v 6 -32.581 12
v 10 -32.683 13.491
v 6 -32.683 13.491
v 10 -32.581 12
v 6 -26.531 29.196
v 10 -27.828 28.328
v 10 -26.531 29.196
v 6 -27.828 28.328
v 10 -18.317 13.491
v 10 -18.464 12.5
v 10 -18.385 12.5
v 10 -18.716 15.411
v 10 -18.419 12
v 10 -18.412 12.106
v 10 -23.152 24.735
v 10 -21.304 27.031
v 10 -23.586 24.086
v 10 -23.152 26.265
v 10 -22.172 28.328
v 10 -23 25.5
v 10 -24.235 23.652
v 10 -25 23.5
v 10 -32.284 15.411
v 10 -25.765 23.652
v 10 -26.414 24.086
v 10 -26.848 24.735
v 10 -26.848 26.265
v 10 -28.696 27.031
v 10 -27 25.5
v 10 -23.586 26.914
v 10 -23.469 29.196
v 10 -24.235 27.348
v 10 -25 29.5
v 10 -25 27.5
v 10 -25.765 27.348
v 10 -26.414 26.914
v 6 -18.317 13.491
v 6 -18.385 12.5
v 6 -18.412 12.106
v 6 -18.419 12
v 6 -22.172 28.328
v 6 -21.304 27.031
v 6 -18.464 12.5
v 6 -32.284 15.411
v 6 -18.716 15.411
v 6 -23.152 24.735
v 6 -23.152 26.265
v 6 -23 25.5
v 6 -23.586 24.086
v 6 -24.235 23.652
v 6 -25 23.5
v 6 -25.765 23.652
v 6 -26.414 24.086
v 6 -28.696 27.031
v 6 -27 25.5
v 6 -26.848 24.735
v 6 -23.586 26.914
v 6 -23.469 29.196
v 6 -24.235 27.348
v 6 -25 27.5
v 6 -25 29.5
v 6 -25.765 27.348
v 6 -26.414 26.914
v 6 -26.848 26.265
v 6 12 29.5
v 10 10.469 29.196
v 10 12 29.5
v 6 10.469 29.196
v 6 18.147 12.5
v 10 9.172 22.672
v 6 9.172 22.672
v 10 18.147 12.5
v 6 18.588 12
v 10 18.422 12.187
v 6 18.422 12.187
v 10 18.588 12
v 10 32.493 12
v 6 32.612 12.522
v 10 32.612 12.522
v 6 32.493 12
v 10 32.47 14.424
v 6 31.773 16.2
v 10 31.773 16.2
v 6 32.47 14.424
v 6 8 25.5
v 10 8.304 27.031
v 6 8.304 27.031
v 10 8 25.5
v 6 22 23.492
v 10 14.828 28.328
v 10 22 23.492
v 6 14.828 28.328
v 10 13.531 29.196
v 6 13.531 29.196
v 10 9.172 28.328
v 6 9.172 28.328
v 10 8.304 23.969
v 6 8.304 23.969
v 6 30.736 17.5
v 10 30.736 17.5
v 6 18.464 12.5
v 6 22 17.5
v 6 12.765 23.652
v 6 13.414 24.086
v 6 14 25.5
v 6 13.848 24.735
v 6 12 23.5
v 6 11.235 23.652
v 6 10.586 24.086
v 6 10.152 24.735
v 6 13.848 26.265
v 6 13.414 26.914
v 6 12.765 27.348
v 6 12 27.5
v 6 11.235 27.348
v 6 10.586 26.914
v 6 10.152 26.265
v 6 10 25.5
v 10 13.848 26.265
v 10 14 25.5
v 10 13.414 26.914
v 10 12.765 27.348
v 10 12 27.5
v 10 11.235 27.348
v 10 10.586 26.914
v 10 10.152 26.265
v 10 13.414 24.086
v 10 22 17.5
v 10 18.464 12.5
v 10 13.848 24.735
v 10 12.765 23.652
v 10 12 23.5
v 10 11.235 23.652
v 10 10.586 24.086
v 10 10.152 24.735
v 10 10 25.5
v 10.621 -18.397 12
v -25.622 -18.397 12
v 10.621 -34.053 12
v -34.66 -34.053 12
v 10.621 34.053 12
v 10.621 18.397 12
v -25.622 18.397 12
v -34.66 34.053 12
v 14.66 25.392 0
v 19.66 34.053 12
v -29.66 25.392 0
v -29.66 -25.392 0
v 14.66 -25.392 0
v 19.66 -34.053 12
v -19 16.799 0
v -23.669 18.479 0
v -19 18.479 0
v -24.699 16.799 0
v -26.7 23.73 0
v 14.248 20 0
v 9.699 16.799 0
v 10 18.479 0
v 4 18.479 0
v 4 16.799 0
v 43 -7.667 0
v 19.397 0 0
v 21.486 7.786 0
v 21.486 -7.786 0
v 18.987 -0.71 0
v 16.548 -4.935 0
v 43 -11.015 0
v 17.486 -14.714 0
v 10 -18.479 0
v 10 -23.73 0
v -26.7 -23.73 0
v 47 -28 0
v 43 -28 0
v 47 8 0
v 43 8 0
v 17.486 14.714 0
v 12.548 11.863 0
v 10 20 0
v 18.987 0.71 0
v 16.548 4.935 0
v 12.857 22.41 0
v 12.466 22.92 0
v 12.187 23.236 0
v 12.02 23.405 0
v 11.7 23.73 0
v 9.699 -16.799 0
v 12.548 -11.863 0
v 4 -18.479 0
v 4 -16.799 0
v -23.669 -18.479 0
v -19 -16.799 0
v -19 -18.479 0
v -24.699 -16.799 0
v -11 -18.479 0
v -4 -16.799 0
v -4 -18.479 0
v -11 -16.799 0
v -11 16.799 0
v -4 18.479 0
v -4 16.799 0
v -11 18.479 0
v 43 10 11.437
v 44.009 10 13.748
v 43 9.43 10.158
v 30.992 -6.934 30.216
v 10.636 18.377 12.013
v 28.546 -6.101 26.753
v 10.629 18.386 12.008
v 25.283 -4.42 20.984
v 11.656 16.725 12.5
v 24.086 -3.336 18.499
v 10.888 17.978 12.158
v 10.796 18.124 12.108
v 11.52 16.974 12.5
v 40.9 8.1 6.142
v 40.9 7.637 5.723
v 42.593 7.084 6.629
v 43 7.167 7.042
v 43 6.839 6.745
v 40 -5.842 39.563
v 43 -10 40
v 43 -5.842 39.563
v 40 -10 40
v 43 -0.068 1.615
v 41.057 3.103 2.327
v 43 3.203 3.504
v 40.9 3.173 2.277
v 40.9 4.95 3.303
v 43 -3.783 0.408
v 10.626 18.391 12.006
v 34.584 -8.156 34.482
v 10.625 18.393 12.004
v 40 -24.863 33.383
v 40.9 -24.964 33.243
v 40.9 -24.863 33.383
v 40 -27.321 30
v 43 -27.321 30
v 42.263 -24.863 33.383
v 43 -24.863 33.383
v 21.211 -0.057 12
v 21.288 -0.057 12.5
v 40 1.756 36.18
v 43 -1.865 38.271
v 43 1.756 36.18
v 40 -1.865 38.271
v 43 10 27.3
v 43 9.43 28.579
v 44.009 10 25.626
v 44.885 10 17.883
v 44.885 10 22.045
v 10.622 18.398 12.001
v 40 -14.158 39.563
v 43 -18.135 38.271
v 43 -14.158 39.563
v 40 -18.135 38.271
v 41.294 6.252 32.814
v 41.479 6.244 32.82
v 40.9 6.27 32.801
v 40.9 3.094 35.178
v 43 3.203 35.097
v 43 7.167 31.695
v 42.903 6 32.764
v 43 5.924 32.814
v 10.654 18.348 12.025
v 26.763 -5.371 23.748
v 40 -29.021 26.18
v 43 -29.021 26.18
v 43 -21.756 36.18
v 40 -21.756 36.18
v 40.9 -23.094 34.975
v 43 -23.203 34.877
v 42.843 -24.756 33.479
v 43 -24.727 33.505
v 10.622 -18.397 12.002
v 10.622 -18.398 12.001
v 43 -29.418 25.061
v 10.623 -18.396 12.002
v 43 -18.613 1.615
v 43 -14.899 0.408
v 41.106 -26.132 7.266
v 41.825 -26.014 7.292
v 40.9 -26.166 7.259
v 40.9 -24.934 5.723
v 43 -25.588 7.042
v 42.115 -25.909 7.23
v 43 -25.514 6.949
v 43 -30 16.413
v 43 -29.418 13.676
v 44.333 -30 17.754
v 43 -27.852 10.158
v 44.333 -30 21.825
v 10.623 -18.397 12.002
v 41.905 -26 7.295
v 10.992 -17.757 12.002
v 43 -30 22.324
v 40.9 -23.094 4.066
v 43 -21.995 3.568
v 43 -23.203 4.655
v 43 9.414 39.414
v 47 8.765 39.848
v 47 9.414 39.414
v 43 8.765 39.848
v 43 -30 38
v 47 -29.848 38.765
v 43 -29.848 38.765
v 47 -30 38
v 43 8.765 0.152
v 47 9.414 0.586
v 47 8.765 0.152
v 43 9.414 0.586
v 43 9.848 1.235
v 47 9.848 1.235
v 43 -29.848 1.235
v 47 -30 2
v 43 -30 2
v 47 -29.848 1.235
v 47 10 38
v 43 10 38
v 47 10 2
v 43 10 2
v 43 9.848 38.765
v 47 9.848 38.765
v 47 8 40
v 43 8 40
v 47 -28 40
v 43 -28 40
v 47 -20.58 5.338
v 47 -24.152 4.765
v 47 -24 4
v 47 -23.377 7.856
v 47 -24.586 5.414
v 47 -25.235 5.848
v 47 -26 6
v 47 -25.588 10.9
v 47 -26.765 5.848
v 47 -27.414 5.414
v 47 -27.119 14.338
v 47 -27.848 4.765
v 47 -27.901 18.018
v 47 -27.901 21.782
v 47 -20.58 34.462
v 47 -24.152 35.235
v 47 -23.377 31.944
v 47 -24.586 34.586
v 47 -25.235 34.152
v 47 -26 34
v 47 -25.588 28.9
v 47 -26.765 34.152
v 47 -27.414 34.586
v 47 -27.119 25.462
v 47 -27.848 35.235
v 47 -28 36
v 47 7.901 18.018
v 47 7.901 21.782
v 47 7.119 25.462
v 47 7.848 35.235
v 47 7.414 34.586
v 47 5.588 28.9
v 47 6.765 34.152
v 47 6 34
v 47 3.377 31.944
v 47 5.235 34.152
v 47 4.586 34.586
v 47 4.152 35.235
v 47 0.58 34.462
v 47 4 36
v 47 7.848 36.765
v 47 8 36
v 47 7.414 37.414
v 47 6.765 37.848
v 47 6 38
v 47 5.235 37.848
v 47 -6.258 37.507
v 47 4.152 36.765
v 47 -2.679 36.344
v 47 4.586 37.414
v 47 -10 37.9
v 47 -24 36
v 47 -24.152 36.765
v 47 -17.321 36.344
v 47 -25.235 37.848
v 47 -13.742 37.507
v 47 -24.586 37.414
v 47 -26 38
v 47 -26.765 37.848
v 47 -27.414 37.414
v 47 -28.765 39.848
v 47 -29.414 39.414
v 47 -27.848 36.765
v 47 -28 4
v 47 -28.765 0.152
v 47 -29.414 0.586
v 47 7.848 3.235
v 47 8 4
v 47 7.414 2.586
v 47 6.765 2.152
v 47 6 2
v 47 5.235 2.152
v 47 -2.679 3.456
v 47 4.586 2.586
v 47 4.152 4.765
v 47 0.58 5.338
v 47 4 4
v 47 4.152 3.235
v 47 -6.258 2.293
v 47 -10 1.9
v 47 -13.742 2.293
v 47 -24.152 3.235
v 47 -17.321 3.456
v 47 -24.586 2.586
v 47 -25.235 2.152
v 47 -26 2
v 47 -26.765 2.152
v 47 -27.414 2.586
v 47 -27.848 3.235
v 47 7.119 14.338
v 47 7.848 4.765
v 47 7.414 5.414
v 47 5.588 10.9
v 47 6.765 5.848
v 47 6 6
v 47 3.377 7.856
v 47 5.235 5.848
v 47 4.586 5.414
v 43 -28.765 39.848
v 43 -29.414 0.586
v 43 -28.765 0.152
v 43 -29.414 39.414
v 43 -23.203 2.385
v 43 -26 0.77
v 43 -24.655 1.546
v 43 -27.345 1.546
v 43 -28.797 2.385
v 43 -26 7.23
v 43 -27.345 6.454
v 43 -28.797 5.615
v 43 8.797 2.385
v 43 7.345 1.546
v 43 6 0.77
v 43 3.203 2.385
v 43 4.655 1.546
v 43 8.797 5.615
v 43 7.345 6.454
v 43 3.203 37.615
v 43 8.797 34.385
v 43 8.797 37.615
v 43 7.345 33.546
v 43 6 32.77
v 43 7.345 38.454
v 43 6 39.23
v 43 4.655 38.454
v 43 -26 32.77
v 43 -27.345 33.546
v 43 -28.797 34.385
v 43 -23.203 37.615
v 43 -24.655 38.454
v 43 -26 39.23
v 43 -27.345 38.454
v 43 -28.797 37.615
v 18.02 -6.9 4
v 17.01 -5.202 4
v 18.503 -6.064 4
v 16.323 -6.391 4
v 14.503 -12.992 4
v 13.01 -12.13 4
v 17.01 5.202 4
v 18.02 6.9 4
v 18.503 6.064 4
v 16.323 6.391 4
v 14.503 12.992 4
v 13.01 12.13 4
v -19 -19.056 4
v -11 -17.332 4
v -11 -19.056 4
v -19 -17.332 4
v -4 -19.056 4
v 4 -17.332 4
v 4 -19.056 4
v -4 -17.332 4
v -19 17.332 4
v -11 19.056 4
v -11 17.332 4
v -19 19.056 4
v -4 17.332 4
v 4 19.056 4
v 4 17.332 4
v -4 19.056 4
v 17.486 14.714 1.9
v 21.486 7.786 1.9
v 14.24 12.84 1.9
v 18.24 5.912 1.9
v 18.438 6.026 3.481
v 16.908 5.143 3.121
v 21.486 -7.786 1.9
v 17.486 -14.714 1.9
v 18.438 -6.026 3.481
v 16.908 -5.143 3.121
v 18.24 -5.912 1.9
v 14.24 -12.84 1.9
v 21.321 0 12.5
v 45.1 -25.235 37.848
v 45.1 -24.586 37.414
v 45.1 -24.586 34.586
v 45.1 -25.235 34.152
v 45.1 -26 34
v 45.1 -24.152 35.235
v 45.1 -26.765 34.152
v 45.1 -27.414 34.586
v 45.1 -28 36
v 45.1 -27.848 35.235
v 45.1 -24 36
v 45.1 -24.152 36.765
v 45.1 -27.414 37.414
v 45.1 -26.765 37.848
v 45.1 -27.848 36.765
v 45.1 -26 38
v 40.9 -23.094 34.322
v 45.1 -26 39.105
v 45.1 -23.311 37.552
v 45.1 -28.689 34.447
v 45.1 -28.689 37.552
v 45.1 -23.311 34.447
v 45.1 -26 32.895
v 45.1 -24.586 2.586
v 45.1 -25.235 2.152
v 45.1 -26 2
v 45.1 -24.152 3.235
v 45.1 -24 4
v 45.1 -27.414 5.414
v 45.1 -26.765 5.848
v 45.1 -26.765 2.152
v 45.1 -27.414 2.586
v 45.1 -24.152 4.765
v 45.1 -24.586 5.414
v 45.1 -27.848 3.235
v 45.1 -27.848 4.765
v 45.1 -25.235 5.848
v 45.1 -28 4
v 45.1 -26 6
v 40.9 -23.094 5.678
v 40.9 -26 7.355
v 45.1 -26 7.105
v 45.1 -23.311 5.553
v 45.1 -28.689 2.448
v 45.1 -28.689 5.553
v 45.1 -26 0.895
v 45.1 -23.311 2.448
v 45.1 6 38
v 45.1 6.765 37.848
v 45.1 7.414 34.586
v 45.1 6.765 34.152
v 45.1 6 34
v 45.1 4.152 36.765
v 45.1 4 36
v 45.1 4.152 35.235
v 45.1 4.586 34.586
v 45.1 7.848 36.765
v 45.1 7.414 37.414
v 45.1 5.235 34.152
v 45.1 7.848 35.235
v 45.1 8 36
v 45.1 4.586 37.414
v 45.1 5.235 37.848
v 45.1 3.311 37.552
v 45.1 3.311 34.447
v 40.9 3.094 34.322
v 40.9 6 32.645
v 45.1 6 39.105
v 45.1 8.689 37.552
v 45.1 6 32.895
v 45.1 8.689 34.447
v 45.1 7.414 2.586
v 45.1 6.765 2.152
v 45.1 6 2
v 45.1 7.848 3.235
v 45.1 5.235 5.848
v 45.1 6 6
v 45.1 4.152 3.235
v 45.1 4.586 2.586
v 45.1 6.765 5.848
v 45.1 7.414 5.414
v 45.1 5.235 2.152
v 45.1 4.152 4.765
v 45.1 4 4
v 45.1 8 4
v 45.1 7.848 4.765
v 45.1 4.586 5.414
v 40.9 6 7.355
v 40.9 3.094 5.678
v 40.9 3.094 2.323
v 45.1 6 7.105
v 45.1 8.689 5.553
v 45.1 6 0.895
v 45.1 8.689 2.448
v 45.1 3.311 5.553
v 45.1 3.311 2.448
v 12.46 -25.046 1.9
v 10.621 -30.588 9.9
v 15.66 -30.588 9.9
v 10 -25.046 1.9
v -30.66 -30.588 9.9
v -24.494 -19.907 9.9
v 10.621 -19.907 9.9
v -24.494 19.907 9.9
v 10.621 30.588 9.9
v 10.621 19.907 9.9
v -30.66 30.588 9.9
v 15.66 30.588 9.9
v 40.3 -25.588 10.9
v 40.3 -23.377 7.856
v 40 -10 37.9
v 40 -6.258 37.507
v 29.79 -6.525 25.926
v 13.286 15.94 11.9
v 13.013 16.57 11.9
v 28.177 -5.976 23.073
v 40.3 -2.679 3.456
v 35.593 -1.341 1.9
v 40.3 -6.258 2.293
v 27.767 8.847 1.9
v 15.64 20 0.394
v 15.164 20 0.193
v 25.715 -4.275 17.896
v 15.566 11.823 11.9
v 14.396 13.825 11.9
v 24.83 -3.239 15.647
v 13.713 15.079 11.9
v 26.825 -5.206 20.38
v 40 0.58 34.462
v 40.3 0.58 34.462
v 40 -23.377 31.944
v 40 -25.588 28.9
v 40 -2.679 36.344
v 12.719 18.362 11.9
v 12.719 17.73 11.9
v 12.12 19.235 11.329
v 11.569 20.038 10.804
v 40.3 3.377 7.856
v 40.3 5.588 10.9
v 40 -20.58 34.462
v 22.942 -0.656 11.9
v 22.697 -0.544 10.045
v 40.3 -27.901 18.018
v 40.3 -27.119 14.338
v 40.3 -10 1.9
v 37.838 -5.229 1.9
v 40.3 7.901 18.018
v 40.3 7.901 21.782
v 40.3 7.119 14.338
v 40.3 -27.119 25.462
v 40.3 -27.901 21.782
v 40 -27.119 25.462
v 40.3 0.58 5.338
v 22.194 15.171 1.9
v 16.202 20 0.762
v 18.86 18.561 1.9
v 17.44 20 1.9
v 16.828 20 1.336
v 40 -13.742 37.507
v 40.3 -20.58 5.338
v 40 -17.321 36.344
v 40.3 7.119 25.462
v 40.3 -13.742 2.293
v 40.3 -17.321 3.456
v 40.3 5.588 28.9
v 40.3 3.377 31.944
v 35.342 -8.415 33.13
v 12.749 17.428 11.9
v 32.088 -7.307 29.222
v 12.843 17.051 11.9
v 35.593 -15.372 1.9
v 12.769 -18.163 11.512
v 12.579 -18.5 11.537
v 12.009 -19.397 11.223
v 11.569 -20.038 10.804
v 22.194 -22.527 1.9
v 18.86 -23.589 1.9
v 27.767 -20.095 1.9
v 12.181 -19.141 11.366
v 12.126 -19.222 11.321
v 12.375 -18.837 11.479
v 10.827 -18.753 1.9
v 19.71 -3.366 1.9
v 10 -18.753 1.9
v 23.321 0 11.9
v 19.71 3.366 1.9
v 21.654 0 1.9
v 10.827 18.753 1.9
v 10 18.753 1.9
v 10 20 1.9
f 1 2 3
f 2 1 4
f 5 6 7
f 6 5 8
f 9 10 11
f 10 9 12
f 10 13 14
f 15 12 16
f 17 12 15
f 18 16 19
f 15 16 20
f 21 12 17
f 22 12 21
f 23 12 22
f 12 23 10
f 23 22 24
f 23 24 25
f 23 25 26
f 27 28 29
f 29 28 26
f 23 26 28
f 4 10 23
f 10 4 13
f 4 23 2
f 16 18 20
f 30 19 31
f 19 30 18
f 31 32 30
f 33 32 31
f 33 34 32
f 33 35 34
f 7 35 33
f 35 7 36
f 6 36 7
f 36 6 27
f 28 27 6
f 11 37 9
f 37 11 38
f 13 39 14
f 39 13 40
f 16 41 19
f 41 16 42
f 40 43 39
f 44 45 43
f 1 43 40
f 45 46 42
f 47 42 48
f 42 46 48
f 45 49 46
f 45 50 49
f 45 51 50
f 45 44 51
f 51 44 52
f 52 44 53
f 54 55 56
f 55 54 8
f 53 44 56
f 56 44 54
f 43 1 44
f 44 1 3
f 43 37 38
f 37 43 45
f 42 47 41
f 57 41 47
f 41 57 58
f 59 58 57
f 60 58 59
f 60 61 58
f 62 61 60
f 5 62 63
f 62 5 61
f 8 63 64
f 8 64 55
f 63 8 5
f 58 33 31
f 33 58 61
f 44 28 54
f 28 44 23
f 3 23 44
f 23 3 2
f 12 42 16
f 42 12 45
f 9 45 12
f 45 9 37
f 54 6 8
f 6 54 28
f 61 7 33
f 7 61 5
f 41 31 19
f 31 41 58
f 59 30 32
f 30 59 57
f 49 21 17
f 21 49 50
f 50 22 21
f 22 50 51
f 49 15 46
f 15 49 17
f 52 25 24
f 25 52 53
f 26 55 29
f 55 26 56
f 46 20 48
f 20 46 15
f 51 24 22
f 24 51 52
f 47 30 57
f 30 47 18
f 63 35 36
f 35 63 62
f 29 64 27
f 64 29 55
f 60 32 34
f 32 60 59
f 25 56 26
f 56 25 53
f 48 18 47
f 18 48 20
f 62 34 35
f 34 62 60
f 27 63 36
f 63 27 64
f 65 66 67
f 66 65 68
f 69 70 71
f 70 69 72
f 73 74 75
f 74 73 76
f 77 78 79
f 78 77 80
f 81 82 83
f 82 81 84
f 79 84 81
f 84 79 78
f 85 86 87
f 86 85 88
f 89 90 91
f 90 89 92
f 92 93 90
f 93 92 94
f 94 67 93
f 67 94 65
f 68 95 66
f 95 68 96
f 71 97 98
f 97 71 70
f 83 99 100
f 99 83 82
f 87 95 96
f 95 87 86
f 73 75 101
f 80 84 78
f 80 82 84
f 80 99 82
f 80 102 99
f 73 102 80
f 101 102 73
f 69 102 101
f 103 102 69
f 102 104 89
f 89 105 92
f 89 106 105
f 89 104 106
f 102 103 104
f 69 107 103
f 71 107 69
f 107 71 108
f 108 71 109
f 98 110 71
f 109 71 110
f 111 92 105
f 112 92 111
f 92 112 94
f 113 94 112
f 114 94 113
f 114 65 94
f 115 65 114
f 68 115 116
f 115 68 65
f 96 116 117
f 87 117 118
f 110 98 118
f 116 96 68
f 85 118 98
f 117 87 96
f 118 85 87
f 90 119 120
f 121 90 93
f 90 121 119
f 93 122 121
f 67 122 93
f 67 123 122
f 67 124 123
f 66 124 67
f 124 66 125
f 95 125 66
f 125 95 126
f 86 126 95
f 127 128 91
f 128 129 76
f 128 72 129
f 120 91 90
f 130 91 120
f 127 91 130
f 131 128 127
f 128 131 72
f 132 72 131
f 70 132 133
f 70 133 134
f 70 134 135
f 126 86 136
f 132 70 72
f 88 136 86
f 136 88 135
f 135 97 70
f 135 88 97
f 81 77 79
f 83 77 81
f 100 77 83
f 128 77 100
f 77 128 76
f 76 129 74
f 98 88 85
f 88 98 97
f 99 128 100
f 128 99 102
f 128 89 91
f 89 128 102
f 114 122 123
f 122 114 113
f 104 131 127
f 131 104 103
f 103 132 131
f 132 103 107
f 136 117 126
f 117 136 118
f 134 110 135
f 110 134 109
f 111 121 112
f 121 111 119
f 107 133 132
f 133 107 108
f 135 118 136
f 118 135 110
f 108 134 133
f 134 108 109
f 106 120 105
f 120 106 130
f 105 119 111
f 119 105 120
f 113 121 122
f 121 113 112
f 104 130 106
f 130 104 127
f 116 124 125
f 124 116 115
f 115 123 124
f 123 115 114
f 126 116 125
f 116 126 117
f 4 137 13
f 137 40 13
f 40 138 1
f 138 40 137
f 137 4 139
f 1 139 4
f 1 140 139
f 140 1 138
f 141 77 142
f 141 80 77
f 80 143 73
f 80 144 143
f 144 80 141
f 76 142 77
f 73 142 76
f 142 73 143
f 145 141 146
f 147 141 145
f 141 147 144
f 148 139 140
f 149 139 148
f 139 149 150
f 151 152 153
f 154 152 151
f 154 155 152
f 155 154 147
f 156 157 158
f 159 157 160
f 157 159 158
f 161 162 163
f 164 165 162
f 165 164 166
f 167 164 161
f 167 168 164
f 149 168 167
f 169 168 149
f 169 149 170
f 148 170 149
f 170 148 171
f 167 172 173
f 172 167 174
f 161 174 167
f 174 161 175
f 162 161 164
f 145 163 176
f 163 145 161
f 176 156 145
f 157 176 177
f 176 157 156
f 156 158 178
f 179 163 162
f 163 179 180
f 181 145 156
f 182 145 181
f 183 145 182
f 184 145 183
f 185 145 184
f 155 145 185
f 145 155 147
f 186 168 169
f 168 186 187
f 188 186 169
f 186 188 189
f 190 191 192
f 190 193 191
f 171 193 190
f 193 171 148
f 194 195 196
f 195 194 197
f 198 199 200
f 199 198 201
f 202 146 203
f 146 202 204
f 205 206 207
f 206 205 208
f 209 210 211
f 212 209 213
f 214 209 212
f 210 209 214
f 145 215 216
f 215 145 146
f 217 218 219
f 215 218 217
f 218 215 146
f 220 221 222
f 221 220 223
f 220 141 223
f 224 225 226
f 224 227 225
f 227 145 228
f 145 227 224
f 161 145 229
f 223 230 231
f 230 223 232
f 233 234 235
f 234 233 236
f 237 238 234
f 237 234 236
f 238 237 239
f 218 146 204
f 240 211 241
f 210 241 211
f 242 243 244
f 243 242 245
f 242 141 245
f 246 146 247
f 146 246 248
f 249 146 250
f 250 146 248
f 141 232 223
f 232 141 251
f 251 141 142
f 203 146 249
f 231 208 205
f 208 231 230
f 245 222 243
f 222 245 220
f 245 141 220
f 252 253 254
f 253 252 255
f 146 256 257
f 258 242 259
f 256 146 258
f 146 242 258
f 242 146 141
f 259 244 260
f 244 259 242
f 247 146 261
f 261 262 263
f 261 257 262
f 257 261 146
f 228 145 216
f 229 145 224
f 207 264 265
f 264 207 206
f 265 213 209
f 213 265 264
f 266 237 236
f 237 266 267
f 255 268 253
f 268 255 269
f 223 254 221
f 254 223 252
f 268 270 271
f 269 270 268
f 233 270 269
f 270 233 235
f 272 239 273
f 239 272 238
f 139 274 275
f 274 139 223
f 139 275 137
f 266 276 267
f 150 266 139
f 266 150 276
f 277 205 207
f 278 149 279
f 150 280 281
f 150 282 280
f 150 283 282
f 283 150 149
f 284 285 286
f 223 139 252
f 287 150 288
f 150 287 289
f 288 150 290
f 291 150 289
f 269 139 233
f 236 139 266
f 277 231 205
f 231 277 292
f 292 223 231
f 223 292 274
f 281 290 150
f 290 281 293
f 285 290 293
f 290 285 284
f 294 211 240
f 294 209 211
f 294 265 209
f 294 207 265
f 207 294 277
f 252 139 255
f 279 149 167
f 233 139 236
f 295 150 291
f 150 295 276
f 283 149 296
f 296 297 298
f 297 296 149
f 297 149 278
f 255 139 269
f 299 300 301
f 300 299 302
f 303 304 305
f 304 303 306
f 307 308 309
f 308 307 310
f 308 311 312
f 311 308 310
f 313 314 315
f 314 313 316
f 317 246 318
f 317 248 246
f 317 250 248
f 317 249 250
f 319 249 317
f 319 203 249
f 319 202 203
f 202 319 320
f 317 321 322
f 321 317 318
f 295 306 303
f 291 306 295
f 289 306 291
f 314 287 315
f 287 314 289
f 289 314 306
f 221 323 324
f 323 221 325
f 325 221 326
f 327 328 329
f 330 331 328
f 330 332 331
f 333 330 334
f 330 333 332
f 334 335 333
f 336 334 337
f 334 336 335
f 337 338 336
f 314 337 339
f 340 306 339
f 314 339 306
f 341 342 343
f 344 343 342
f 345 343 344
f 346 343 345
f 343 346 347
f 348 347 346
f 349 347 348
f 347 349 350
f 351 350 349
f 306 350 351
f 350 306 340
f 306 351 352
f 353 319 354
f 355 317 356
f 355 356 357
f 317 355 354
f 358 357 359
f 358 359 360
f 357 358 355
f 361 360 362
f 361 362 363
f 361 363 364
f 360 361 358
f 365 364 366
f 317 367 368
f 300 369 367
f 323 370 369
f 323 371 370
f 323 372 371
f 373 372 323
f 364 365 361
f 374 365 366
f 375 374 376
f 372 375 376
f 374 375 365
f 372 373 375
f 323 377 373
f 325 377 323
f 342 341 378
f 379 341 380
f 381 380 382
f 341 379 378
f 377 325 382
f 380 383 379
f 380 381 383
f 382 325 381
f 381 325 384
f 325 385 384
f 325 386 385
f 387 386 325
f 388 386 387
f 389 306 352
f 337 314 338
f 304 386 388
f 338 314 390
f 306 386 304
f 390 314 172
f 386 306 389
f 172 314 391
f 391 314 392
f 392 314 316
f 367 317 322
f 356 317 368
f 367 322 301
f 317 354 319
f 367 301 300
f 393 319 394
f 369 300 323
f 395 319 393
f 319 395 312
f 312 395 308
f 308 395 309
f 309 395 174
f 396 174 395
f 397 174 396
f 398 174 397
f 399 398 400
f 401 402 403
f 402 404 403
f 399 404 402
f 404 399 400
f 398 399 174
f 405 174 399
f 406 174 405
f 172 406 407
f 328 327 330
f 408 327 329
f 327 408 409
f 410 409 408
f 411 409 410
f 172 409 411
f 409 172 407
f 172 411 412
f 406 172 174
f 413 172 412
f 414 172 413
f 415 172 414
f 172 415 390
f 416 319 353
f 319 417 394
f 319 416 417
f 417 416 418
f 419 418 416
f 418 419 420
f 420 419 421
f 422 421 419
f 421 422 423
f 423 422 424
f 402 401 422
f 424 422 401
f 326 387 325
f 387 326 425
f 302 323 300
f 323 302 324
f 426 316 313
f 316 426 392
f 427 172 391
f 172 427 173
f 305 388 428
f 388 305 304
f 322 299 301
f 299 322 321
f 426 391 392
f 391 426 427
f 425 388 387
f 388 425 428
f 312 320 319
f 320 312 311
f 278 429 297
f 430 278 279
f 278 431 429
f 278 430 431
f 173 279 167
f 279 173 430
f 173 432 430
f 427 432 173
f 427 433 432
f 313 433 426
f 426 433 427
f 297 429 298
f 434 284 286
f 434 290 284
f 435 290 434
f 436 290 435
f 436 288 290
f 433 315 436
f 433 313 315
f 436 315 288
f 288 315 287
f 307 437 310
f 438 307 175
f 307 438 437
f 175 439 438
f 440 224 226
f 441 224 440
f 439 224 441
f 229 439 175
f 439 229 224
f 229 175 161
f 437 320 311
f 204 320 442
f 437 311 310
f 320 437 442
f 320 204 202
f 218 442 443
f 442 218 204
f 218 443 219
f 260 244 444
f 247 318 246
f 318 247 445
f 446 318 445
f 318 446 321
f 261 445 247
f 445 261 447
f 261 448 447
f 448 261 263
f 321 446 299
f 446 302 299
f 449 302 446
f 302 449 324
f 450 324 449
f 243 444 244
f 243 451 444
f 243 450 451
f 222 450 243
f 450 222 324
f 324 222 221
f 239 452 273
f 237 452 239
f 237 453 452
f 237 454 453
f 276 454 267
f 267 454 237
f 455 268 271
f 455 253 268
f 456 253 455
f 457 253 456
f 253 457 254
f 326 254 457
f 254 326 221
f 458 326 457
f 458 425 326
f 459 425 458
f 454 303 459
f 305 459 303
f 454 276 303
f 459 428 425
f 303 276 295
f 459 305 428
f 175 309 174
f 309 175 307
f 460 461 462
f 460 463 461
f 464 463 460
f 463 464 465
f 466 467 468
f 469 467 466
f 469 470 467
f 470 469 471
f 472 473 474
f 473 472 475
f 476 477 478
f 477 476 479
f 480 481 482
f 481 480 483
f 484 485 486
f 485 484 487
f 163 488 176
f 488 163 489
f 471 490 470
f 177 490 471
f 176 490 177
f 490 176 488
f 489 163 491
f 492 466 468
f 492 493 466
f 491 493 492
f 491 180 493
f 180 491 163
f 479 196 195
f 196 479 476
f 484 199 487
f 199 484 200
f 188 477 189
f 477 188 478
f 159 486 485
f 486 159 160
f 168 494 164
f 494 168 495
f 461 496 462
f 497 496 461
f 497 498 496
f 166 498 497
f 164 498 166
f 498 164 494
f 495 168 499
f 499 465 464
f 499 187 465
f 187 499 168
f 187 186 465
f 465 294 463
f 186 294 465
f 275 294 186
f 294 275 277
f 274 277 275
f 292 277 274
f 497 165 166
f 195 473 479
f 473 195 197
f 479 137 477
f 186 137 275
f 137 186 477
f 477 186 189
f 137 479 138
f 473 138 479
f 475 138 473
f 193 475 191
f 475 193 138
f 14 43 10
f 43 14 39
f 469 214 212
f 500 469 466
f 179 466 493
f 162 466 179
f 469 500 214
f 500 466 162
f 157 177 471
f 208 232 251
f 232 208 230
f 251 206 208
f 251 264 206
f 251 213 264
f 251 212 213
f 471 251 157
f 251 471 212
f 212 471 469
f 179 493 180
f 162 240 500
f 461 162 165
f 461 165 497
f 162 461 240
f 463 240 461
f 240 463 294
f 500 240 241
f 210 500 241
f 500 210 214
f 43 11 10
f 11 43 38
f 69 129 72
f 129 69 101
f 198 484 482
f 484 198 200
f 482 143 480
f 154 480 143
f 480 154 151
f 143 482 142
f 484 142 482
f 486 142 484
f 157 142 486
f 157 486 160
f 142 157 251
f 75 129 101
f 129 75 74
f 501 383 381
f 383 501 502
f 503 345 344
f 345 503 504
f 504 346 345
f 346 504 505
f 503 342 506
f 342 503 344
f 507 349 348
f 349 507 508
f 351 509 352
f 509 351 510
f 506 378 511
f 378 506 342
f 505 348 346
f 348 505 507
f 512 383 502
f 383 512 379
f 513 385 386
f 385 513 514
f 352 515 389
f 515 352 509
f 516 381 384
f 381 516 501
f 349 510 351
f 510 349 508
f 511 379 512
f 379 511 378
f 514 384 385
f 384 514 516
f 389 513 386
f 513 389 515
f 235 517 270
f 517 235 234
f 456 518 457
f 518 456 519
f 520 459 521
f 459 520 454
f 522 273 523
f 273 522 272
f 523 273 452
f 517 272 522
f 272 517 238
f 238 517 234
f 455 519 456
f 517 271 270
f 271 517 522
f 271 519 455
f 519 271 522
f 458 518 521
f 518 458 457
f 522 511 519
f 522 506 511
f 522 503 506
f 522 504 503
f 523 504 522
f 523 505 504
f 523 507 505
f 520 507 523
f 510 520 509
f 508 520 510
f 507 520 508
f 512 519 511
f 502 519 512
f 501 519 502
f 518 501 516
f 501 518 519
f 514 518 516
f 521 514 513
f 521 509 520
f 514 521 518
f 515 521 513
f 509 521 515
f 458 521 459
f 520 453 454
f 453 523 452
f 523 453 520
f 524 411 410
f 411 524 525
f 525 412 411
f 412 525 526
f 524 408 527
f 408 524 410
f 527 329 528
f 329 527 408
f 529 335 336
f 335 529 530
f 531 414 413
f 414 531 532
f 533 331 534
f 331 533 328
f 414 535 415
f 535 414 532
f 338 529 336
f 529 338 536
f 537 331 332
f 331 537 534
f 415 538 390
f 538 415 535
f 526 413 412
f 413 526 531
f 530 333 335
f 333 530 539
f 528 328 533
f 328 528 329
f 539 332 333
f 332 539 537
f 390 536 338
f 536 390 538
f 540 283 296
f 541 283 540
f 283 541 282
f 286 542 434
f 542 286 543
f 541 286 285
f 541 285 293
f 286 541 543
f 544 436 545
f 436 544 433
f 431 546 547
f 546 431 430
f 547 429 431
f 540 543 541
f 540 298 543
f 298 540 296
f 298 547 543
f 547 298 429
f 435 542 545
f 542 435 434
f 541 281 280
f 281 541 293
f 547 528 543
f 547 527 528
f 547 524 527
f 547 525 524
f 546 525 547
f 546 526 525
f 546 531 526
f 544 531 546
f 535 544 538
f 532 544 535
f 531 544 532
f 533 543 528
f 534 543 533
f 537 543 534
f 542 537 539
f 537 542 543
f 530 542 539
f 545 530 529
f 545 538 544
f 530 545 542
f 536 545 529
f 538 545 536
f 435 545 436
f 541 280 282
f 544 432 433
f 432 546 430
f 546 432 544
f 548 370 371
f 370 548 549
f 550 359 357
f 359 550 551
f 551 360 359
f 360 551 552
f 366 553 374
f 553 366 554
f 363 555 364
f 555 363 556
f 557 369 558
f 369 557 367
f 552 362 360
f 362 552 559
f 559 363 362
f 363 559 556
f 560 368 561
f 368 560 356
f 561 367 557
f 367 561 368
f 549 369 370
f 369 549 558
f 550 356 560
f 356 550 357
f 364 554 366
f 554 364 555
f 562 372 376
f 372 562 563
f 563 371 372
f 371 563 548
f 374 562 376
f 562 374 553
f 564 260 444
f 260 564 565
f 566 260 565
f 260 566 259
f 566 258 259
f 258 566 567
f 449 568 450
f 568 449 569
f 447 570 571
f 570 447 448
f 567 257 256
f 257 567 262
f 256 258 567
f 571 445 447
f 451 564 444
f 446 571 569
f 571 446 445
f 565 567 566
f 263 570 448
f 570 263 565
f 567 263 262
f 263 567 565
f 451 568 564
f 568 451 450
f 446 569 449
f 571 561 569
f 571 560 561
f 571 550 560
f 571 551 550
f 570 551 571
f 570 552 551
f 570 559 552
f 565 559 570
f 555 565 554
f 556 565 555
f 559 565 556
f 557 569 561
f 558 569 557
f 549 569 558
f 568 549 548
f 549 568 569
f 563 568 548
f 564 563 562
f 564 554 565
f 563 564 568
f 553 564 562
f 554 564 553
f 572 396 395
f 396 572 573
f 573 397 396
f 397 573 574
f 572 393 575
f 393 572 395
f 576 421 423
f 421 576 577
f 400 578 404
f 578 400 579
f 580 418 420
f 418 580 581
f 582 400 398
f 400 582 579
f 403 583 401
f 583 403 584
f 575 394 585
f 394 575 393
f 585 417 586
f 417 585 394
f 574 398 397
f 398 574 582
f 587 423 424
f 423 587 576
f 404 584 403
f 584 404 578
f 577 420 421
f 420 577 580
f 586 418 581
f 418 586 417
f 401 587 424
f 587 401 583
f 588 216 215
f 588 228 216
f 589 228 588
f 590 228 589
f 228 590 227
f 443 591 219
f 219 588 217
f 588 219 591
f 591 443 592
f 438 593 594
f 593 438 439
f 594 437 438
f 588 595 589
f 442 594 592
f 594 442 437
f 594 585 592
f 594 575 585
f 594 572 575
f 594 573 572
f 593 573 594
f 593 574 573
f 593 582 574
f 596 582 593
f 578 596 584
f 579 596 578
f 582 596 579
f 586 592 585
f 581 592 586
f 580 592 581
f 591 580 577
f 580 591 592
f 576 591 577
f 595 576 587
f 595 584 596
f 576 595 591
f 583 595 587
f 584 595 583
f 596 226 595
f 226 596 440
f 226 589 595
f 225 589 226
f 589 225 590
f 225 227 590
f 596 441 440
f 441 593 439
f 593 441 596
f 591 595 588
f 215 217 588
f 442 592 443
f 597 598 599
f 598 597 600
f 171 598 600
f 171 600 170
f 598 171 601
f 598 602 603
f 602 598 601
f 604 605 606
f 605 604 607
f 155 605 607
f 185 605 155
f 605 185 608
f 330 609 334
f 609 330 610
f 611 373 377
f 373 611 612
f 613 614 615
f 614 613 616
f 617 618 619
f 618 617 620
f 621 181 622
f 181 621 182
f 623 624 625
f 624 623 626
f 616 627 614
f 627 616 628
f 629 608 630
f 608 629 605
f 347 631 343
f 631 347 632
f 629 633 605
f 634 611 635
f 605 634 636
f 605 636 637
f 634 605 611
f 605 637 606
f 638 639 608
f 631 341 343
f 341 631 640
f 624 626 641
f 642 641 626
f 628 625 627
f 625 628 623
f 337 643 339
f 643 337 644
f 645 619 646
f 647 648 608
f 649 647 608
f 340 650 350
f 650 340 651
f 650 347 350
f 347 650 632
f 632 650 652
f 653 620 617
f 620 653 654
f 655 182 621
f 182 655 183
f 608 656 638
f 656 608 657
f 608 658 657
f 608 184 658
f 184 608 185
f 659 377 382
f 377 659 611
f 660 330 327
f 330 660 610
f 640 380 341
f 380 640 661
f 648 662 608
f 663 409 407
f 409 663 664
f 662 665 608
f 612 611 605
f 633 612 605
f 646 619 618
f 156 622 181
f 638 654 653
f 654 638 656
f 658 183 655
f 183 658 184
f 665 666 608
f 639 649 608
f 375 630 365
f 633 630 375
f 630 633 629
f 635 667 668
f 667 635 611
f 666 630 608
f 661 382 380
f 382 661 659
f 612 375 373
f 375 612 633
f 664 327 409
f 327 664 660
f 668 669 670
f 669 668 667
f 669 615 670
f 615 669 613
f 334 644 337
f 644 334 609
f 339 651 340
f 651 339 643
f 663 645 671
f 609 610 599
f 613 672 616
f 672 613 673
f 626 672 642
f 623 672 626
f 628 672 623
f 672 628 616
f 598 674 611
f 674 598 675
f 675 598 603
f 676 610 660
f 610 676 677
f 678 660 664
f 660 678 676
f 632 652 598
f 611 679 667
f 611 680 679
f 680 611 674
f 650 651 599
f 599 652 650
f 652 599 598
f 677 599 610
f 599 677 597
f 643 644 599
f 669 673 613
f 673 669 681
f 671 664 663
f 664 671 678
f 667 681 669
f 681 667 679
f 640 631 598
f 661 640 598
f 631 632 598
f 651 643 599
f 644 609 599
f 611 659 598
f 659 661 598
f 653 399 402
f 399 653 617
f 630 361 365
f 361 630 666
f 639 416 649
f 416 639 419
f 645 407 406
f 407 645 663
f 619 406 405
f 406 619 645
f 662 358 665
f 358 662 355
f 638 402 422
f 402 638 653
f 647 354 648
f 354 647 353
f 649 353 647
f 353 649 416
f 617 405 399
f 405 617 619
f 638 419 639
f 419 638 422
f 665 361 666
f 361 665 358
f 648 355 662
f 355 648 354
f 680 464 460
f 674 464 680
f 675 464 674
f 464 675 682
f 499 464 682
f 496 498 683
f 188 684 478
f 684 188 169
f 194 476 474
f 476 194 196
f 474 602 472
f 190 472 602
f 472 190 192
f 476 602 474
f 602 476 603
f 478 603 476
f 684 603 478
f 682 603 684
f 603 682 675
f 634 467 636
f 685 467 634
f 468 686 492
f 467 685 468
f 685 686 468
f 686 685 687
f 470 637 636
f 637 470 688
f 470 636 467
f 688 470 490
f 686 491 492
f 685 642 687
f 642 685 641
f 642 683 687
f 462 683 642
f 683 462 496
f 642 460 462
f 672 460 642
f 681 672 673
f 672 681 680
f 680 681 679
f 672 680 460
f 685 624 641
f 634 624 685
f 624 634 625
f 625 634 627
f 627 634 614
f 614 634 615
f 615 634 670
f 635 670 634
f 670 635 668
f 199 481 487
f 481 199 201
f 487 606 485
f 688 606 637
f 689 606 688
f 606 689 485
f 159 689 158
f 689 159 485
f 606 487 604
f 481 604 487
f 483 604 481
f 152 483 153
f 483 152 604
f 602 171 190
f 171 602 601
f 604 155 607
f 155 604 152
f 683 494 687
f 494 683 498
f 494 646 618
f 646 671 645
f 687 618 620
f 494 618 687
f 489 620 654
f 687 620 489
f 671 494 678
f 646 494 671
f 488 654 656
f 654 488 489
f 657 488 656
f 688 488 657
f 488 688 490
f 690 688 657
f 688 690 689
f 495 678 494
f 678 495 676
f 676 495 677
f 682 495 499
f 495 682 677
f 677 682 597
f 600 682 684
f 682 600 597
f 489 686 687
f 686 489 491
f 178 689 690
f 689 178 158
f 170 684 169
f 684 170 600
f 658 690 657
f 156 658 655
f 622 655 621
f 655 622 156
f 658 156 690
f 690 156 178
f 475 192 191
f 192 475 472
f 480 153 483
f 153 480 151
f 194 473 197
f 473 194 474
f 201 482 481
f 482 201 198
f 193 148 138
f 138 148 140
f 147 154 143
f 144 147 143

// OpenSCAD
hot_rad = 30/2/cos(30);
hotend_x=25;
fan_x = 15+5;

hotend_y=-10;

thickness = 10;
wall=2;
slop=.2;

fan_hole = (40-wall-wall)/2;
mount_drop = 10;
aero_fan_drop = 15.5 + 4 + 6;
fan_z = fan_hole+wall;

//fan_mount();
aero_fan_mount();
//fan_mount_blower();
//bowden_fan();
//translate([0,60,0]) cyclops_fan();

%cylinder(r=hot_rad, h=20, center=true);
%translate([-23,0,0]) cylinder(r=hot_rad, h=20, center=true);

m3_cap_rad = 4;
m3_rad = 2;
m3_nut_rad = 6.01/2+.1;

facets = 6;

duct_angle=-5;
duct_jut = -5;

module aero_fan_mount(){
    difference(){
        union(){
            //core
            cylinder(r1=hot_rad+thickness+wall, r2=hot_rad+thickness*2+wall, h=thickness+wall, $fn=facets);
            translate([-15,0,0])cylinder(r1=hot_rad+thickness+wall, r2=hot_rad+thickness*2+wall, h=thickness+wall, $fn=facets);
            
            hull(){
                intersection(){
                    difference(){
                        cylinder(r1=hot_rad+thickness+wall, r2=hot_rad+thickness*2+wall, h=thickness+wall, $fn=facets);
                        translate([0,0,-.5]) cylinder(r1=hot_rad+wall, r2=hot_rad+wall+wall, h=thickness+wall+1, $fn=facets);
                    }
                    translate([50+hot_rad-6.7,50,50]) cube([100,100,100], center=true);
                }
                translate([hotend_x+fan_x-5,hotend_y,fan_z]) rotate([0,90,0]) cylinder(r=fan_hole+wall, h=5);
            }
            
            hull(){
                intersection(){
                    difference(){
                        cylinder(r1=hot_rad+thickness+wall, r2=hot_rad+thickness*2+wall, h=thickness+wall, $fn=facets);
                        translate([0,0,-.5]) cylinder(r1=hot_rad+wall, r2=hot_rad+wall+wall, h=thickness+wall+1, $fn=facets);
                    }
                    translate([50+hot_rad-6.7,-50,50]) cube([100,100,100], center=true);
                }
                translate([hotend_x+fan_x-5,hotend_y,fan_z]) rotate([0,90,0]) cylinder(r=fan_hole+wall, h=5);
            }
            
            //fan mount
            translate([hotend_x+fan_x,hotend_y,fan_z]) rotate([0,90,0]){
                hull() for(i=[0:90:359]) rotate([0,0,i]) {
                    translate([20-wall,20-wall,-wall]) cylinder(r=wall,h=wall*2, $fn=16);
                }    
            }
            
            //mounting lugs above fan
            translate([hotend_x-2,-4,0]) rotate([0,90,0]){
               difference(){
                    hull(){
                        translate([-aero_fan_drop,-21,-fan_x+3]) cylinder(r=m3_rad+wall, h=wall*2, $fn=16);
                        translate([-mount_drop-3,2*-10.75,-fan_x+3]) cylinder(r=m3_cap_rad*1.8, h=wall*2);
                    }
                    translate([-aero_fan_drop,-21,-fan_x+3-.1]) cylinder(r=m3_rad, h=wall*2+1, $fn=16);
                }
                #difference(){
                    hull(){
                        translate([-aero_fan_drop,16,-fan_x+3]) cylinder(r=m3_rad+wall, h=wall*2, $fn=16);
                        translate([-mount_drop-3,1.205*26-1.1,-fan_x+3]) cylinder(r=m3_cap_rad*1.6, h=wall*2);
                    }
                    translate([-aero_fan_drop,16+10,-fan_x+3-.1]) cube([8,20,wall*2+slop]);
                    translate([-aero_fan_drop,16,-fan_x+3-.1]) cylinder(r=m3_rad, h=wall*2+1, $fn=16);
                }
            }
        }
        //extra slots
        for(i=[30:360/6:179]) rotate([0,0,i]) {
            cube([45,8,8],center=true);
        }
        translate([-15,0,0]) rotate([0,0,90]) cube([45,8,8],center=true);

        //center cutout
        union(){
            translate([0,0,-.5]) cylinder(r1=hot_rad+wall, r2=hot_rad+wall+wall, h=thickness+wall+1, $fn=facets);
            translate([-15,0,-.5]) cylinder(r1=hot_rad+wall, r2=hot_rad+wall+wall, h=thickness+wall+1, $fn=facets);
            translate([-25,0,-.5]) cylinder(r1=hot_rad+wall, r2=hot_rad+wall+wall, h=thickness+wall+1, $fn=facets);
        }    
        //front cutout
        translate([-(hot_rad+thickness*2+wall)-15,0,0]) cylinder(r=hot_rad+thickness*2+wall, h=thickness+wall*10, center=true, $fn=facets);
        
        //fan holes
        translate([hotend_x+fan_x,hotend_y,fan_z]) rotate([0,90,0]){
            for(i=[-16, 16]) for(j=[-16, 16]) {
                translate([j,i,-.1]) cylinder(r=m3_rad, h=wall+.2, $fn=16);
                translate([j,i,-wall*2-.1]) cylinder(r2=m3_nut_rad, r1=m3_nut_rad+.25, h=wall*2+.2, $fn=6);
            }
        }
        
        //air path
        translate([0,0,-.1]) difference(){
            union(){
                translate([-wall,0,0]) cylinder(r1=hot_rad+thickness, r2=hot_rad+thickness*2-wall, h=thickness, $fn=facets);
                translate([-wall-15,0,0]) cylinder(r1=hot_rad+thickness, r2=hot_rad+thickness*2-wall, h=thickness, $fn=facets);
                hull(){
                    intersection(){
                        difference(){
                            translate([-wall,0,0]) cylinder(r1=hot_rad+thickness, r2=hot_rad+thickness*2-wall, h=thickness, $fn=facets);
                            translate([0,0,-.5]) cylinder(r1=hot_rad+wall*2, r2=hot_rad+wall*3, h=thickness+wall+1, $fn=facets);
                        }
                        translate([50+hot_rad-6.7,50,50]) cube([100,100,100], center=true);
                    }
                    translate([hotend_x+fan_x-5,hotend_y,fan_z]) rotate([0,90,0]) cylinder(r=fan_hole, h=.3);
                }
                
                hull(){
                    intersection(){
                        difference(){
                            translate([-wall,0,0]) cylinder(r1=hot_rad+thickness, r2=hot_rad+thickness*2-wall, h=thickness, $fn=facets);
                            translate([0,0,-.5]) cylinder(r1=hot_rad+wall+wall, r2=hot_rad+wall+wall+wall, h=thickness+wall+1, $fn=facets);
                        }
                        translate([50+hot_rad-6.7,-50,50]) cube([100,100,100], center=true);
                    }
                    translate([hotend_x+fan_x-5,hotend_y,fan_z]) rotate([0,90,0]) cylinder(r=fan_hole, h=.3);
                }
                
                translate([hotend_x+fan_x-5,hotend_y,fan_z]) rotate([0,90,0]) cylinder(r=fan_hole, h=wall+1+5);
            }
            cylinder(r1=hot_rad+wall+wall, r2=hot_rad+wall+wall+wall, h=thickness+wall, $fn=facets);
            translate([-15,0,0])cylinder(r1=hot_rad+wall+wall, r2=hot_rad+wall+wall+wall, h=thickness+wall, $fn=facets);
            translate([-(hot_rad+thickness*2)-15,0,0]) cylinder(r=hot_rad+thickness*2+wall, h=thickness+wall*10, center=true, $fn=facets);
            translate([10,hotend_y/2-25,0])cube([100,50,wall]);
            //translate([0,-2.5+hotend_y/2,0])cube([100,10,wall]);

        }
    }
}

module fan_mount(){
    difference(){
        union(){
            //core
            cylinder(r1=hot_rad+thickness+wall, r2=hot_rad+thickness*2+wall, h=thickness+wall, $fn=facets);
            
            hull(){
                intersection(){
                    difference(){
                        cylinder(r1=hot_rad+thickness+wall, r2=hot_rad+thickness*2+wall, h=thickness+wall, $fn=facets);
                        translate([0,0,-.5]) cylinder(r1=hot_rad+wall, r2=hot_rad+wall+wall, h=thickness+wall+1, $fn=facets);
                    }
                    translate([50+hot_rad-6.7,50,50]) cube([100,100,100], center=true);
                }
                translate([hotend_x+fan_x-5,hotend_y,fan_z]) rotate([0,90,0]) cylinder(r=fan_hole+wall, h=5);
            }
            
            hull(){
                intersection(){
                    difference(){
                        cylinder(r1=hot_rad+thickness+wall, r2=hot_rad+thickness*2+wall, h=thickness+wall, $fn=facets);
                        translate([0,0,-.5]) cylinder(r1=hot_rad+wall, r2=hot_rad+wall+wall, h=thickness+wall+1, $fn=facets);
                    }
                    translate([50+hot_rad-6.7,-50,50]) cube([100,100,100], center=true);
                }
                translate([hotend_x+fan_x-5,hotend_y,fan_z]) rotate([0,90,0]) cylinder(r=fan_hole+wall, h=5);
            }
            
            //fan mount
            translate([hotend_x+fan_x,hotend_y,fan_z]) rotate([0,90,0]){
                hull() for(i=[0:90:359]) rotate([0,0,i]) {
                    #translate([20-wall,20-wall,-wall]) cylinder(r=wall,h=wall*2, $fn=16);
                }    
            }
            
            //mounting lugs above fan
            #translate([hotend_x+fan_x,hotend_y,fan_z]) rotate([0,90,0]){
                for(i=[-16, 16]) difference(){
                    hull(){
                        translate([-16-mount_drop,i,-fan_x+3]) cylinder(r=m3_rad+wall, h=wall*2, $fn=16);
                        translate([0,i,-fan_x+3]) cylinder(r=m3_cap_rad*2, h=wall);
                    }
                    translate([-16-mount_drop,i,-fan_x+3-.1]) cylinder(r=m3_rad, h=wall*2+1, $fn=16);
                }
            }
        }
        
        //center cutout
        translate([0,0,-.5]) cylinder(r1=hot_rad+wall, r2=hot_rad+wall+wall, h=thickness+wall+1, $fn=facets);
                
        //front cutout
        translate([-(hot_rad+thickness*2+wall),0,0]) cylinder(r=hot_rad+thickness*2+wall, h=thickness+wall*10, center=true, $fn=facets);
        
        //fan holes
        translate([hotend_x+fan_x,hotend_y,fan_z]) rotate([0,90,0]){
            for(i=[-16, 16]) for(j=[-16, 16]) {
                #translate([j,i,-.1]) cylinder(r=m3_rad, h=wall+.2, $fn=16);
                translate([j,i,-wall*2-.1]) cylinder(r2=m3_nut_rad, r1=m3_nut_rad+.25, h=wall*2+.2, $fn=6);
            }
        }
        
        //air path
        translate([0,0,-.1]) difference(){
            union(){
                translate([-wall,0,0]) cylinder(r1=hot_rad+thickness, r2=hot_rad+thickness*2-wall, h=thickness, $fn=facets);
                
                hull(){
                    intersection(){
                        difference(){
                            translate([-wall,0,0]) cylinder(r1=hot_rad+thickness, r2=hot_rad+thickness*2-wall, h=thickness, $fn=facets);
                            translate([0,0,-.5]) cylinder(r1=hot_rad+wall*2, r2=hot_rad+wall*3, h=thickness+wall+1, $fn=facets);
                        }
                        translate([50+hot_rad-6.7,50,50]) cube([100,100,100], center=true);
                    }
                    translate([hotend_x+fan_x-5,hotend_y,fan_z]) rotate([0,90,0]) cylinder(r=fan_hole, h=.3);
                }
                
                hull(){
                    intersection(){
                        difference(){
                            translate([-wall,0,0]) cylinder(r1=hot_rad+thickness, r2=hot_rad+thickness*2-wall, h=thickness, $fn=facets);
                            translate([0,0,-.5]) cylinder(r1=hot_rad+wall+wall, r2=hot_rad+wall+wall+wall, h=thickness+wall+1, $fn=facets);
                        }
                        translate([50+hot_rad-6.7,-50,50]) cube([100,100,100], center=true);
                    }
                    translate([hotend_x+fan_x-5,hotend_y,fan_z]) rotate([0,90,0]) cylinder(r=fan_hole, h=.3);
                }
                
                translate([hotend_x+fan_x-5,hotend_y,fan_z]) rotate([0,90,0]) cylinder(r=fan_hole, h=wall+1+5);
            }
            cylinder(r1=hot_rad+wall+wall, r2=hot_rad+wall+wall+wall, h=thickness+wall, $fn=facets);
            translate([-(hot_rad+thickness*2),0,0]) cylinder(r=hot_rad+thickness*2+wall, h=thickness+wall*10, center=true, $fn=facets);
            translate([0,-5+hotend_y/2,0])cube([100,10,wall]);
        }
    }
}


module bowden_fan(){
    duct_w = 15+slop;
    duct_h = 20+slop;
    duct_offset=38;
    
    mount_height = 46;
    
    offset = -20;
    difference(){
        union(){
            //core
            hull(){
                cylinder(r1=hot_rad+thickness+wall, r2=hot_rad+thickness*2+wall, h=thickness+wall, $fn=facets);
                translate([offset,0,0]) cylinder(r1=hot_rad+thickness+wall, r2=hot_rad+thickness*2+wall, h=thickness+wall, $fn=facets);
            }
            
            //connection to duct
            hull(){
                intersection(){
                    cylinder(r1=hot_rad+thickness+wall, r2=hot_rad+thickness*2+wall, h=thickness+wall, $fn=facets);
                    translate([hot_rad+wall*2,0,0]) cube([1,200,200], center=true);
                }
                translate([duct_offset,duct_jut,duct_h/2+wall]) rotate([0,0,duct_angle]) cube([1,duct_w+wall*2, duct_h+wall*2], center=true);
            }
            
            //the duct connector
            translate([duct_offset,duct_jut,0]) rotate([0,0,duct_angle]) duct();
            
            //mounting lugs
           for(i=[10,-20,-40]) difference(){
                translate([i,hot_rad+wall*2,0]) hull(){
                    translate([5,0,thickness]) rotate([90,0,0]) cylinder(r=m3_cap_rad+wall*2, h=wall, center=true);
                    translate([0,0,mount_height]) rotate([90,0,0]) cylinder(r=m3_cap_rad+wall, h=wall, center=true);
                }
                
                //mounting holes up top
                translate([i,hot_rad+wall*2,mount_height]) rotate([90,0,0]) cylinder(r=m3_rad+slop, h=20, center=true);
            }
        }
        
        //connection to duct airflow
        hull(){
            intersection(){
                translate([0,0,wall]) cylinder(r1=hot_rad+thickness, r2=hot_rad+thickness*2, h=thickness-wall, $fn=facets);
                translate([hot_rad+wall*3,0,0]) cube([1,200,200], center=true);
            }
            translate([duct_offset,duct_jut,duct_h/2+wall]) rotate([0,0,duct_angle]) cube([1.2,duct_w, duct_h], center=true);
        }
        
        //center cutout
        translate([0,0,-.5]) hull(){
            cylinder(r1=hot_rad+wall, r2=hot_rad+wall*3, h=thickness+wall+1, $fn=facets);
            translate([2*offset,0,0]) cylinder(r1=hot_rad+wall, r2=hot_rad+wall*3, h=thickness+wall+1, $fn=facets);
        }
        
        //air path
        difference(){
            //core
            translate([0,0,-.1]) hull(){
                cylinder(r1=hot_rad+thickness, r2=hot_rad+thickness*2-wall, h=thickness, $fn=facets);
                translate([offset+wall,0,0]) cylinder(r1=hot_rad+thickness, r2=hot_rad+thickness*2-wall, h=thickness, $fn=facets);
            }
            
            //keep the center walls in place
            translate([0,0,-.5]) hull(){
                cylinder(r1=hot_rad+wall*2, r2=hot_rad+wall*4, h=thickness+wall+1, $fn=facets);
                translate([2*offset,0,0]) cylinder(r1=hot_rad+wall*2, r2=hot_rad+wall*4, h=thickness+wall+1, $fn=facets);
            }
            
            //bottom on the near side
            translate([10,0,-.5]) cylinder(r1=hot_rad+wall*2, r2=hot_rad+wall*2.5, h=wall+.5, $fn=facets);
        }
    }
}

module cyclops_fan(){
    duct_w = 15+slop;
    duct_h = 20+slop;
    duct_offset=38;
    
    mount_height = 46-1.5;
    mount_offset = 10;
    
    offset = -11;
    difference(){
        union(){
            //core
            hull(){
                cylinder(r1=hot_rad+thickness+wall, r2=hot_rad+thickness*2+wall, h=thickness+wall, $fn=facets);
                translate([offset,0,0]) cylinder(r1=hot_rad+thickness+wall, r2=hot_rad+thickness*2+wall, h=thickness+wall, $fn=facets);
            }
            
            //connection to duct
            #hull(){
                intersection(){
                    cylinder(r1=hot_rad+thickness+wall, r2=hot_rad+thickness*2+wall, h=thickness+wall, $fn=facets);
                    translate([hot_rad+wall*2,0,0]) cube([1,200,200], center=true);
                }
                translate([duct_offset,duct_jut,duct_h/2+wall]) rotate([0,0,duct_angle]) cube([1,duct_w+wall*2, duct_h+wall*2], center=true);
            }
            
            //the duct connector
            translate([duct_offset,duct_jut,0]) rotate([0,0,duct_angle]) duct();
            
            //mounting lugs
           for(i=[10-mount_offset,-20-mount_offset]) difference(){
                translate([i,hot_rad+wall*2,0]) hull(){
                    translate([5,0,thickness]) rotate([90,0,0]) cylinder(r=m3_cap_rad+wall*2, h=wall, center=true);
                    translate([0,0,mount_height]) rotate([90,0,0]) cylinder(r=m3_cap_rad+wall, h=wall, center=true);
                }
                
                //mounting holes up top
                translate([i,hot_rad+wall*2,mount_height]) rotate([90,0,0]) cylinder(r=m3_rad+slop, h=20, center=true);
            }
        }
        
        //connection to duct airflow
        hull(){
            intersection(){
                translate([0,0,wall]) cylinder(r1=hot_rad+thickness, r2=hot_rad+thickness*2, h=thickness-wall, $fn=facets);
                translate([hot_rad+wall*3,0,0]) cube([1,200,200], center=true);
            }
            translate([duct_offset,duct_jut,duct_h/2+wall]) rotate([0,0,duct_angle]) cube([1.2,duct_w, duct_h], center=true);
        }
        
        //center cutout
        translate([0,0,-.5]) hull(){
            cylinder(r1=hot_rad+wall, r2=hot_rad+wall*3, h=thickness+wall+1, $fn=facets);
            translate([5*offset,0,0]) cylinder(r1=hot_rad+wall, r2=hot_rad+wall*3, h=thickness+wall+1, $fn=facets);
        }
        
        //air path
        difference(){
            //core
            translate([0,0,-.1]) hull(){
                cylinder(r1=hot_rad+thickness, r2=hot_rad+thickness*2-wall, h=thickness, $fn=facets);
                translate([offset+wall,0,0]) cylinder(r1=hot_rad+thickness, r2=hot_rad+thickness*2-wall, h=thickness, $fn=facets);
            }
            
            //keep the center walls in place
            translate([0,0,-.5]) hull(){
                cylinder(r1=hot_rad+wall*2, r2=hot_rad+wall*4, h=thickness+wall+1, $fn=facets);
                translate([5*offset,0,0]) cylinder(r1=hot_rad+wall*2, r2=hot_rad+wall*4, h=thickness+wall+1, $fn=facets);
            }
            
            //bottom on the near side
            translate([10,0,-.5]) cylinder(r1=hot_rad+wall*2, r2=hot_rad+wall*2.5, h=wall+.5, $fn=facets);
        }
    }
}

module fan_mount_blower(){
    duct_w = 15+slop;
    duct_h = 20+slop;
    //duct_offset=38;

// Rakish    
//    duct_jut = -7;
//    duct_angle = -25;
//    duct_extend = 3;
//    fan_x = 15+5+10+10+5-8;
//    tongue_width = hot_rad*2-wall;

// Longer, lower angle   
    duct_jut = -5;
    duct_angle = -10;
    duct_extend = 8;
    fan_x = 8+15+5+10+10+5-8;
    tongue_width = 10;
    
    difference(){
        union(){
            //core
            cylinder(r1=hot_rad+thickness+wall, r2=hot_rad+thickness*2+wall, h=thickness+wall, $fn=facets);
            
            //rear duct transition
            hull(){
                intersection(){
                    difference(){
                        cylinder(r1=hot_rad+thickness+wall, r2=hot_rad+thickness*2+wall, h=thickness+wall, $fn=facets);
                        translate([0,0,-.5]) cylinder(r1=hot_rad+wall, r2=hot_rad+wall+wall, h=thickness+wall+1, $fn=facets);
                    }
                    translate([50+hot_rad-6.7,50,50]) cube([100,100,100], center=true);
                }
                
                //this is the duct!
                #translate([fan_x,duct_jut,duct_h/2+wall]) rotate([0,0,duct_angle]) cube([1,duct_w+wall*2, duct_h+wall*2], center=true);
                
                %translate([fan_x,duct_jut,duct_h/2+wall]) rotate([0,0,duct_angle]) translate([25,0,0]) cube([50,15,50], center=true);
            }
            
            //front duct transition
            hull(){
                intersection(){
                    difference(){
                        cylinder(r1=hot_rad+thickness+wall, r2=hot_rad+thickness*2+wall, h=thickness+wall, $fn=facets);
                        translate([0,0,-.5]) cylinder(r1=hot_rad+wall, r2=hot_rad+wall+wall, h=thickness+wall+1, $fn=facets);
                    }
                    translate([50+hot_rad-6.7,-50,50]) cube([100,100,100], center=true);
                }
                //this is the duct!
                translate([fan_x,duct_jut,duct_h/2+wall]) rotate([0,0,duct_angle]) cube([1,duct_w+wall*2, duct_h+wall*2], center=true);
            }
            
            //the duct connector
            translate([fan_x,duct_jut,0]) rotate([0,0,duct_angle]) {
                translate([duct_extend/2,0,duct_h/2+wall]) difference(){
                    cube([duct_extend*1.05, duct_w+wall*2, duct_h+wall*2], center=true);
                    cube([duct_extend*1.1, duct_w, duct_h], center=true);
                }
                translate([duct_extend,0,0]) duct_angle(angle=0);
            }
            
            //mounting lugs above fan
            translate([hotend_x+fan_x,hotend_y,fan_z]) rotate([0,90,0]){
                for(i=[-16, 16]) difference(){
                    hull(){
                        translate([-16-mount_drop,i,-fan_x+3]) cylinder(r=m3_rad+wall, h=wall*2, $fn=16);
                        translate([0,i,-fan_x+3]) cylinder(r=m3_cap_rad*2, h=wall*2);
                    }
                    translate([-16-mount_drop,i,-fan_x+3-.1]) cylinder(r=m3_rad, h=wall*2+1, $fn=16);
                }
            }
        }
        
        //center cutout
        translate([0,0,-.5]) cylinder(r1=hot_rad+wall, r2=hot_rad+wall+wall, h=thickness+wall+1, $fn=facets);
                
        //front cutout
        translate([-(hot_rad+thickness*2+wall),0,0]) cylinder(r=hot_rad+thickness*2+wall, h=thickness+wall*10, center=true, $fn=facets);
        
        //air path
        translate([0,0,-.1]) difference(){
            union(){
                translate([-wall,0,0]) cylinder(r1=hot_rad+thickness, r2=hot_rad+thickness*2-wall, h=thickness, $fn=facets);
                
                hull(){
                    intersection(){
                        difference(){
                            translate([-wall,0,0]) cylinder(r1=hot_rad+thickness, r2=hot_rad+thickness*2-wall, h=thickness, $fn=facets);
                            translate([0,0,-.5]) cylinder(r1=hot_rad+wall*2, r2=hot_rad+wall*3, h=thickness+wall+1, $fn=facets);
                        }
                        translate([50+hot_rad-6.7,50,50]) cube([100,100,100], center=true);
                    }
                    
                    //this is the duct!
                    translate([fan_x,duct_jut,duct_h/2+wall]) rotate([0,0,duct_angle]) cube([1.1,duct_w, duct_h], center=true);
                }
                
                hull(){
                    intersection(){
                        difference(){
                            translate([-wall,0,0]) cylinder(r1=hot_rad+thickness, r2=hot_rad+thickness*2-wall, h=thickness, $fn=facets);
                            translate([0,0,-.5]) cylinder(r1=hot_rad+wall*2, r2=hot_rad+wall*3, h=thickness+wall+1, $fn=facets);
                        }
                        translate([50+hot_rad-6.7,-50,50]) cube([100,100,100], center=true);
                    }
                    
                    //this is the duct!
                    translate([fan_x,duct_jut,duct_h/2+wall]) rotate([0,0,duct_angle]) cube([1.1,duct_w, duct_h], center=true);
                }
                
                //translate([hotend_x+fan_x-5,hotend_y,fan_z]) rotate([0,90,0]) cylinder(r=fan_hole, h=wall+1+5);
            }
            
            //cylinder(r1=hot_rad+wall+wall, r2=hot_rad+wall+wall+wall, h=thickness+wall, $fn=facets);
            difference(){
                                translate([0,0,-.5]) cylinder(r1=hot_rad+wall+wall, r2=hot_rad+wall+wall+wall, h=thickness+wall+1, $fn=facets);
                                //this adds some holes to direct air straight into the hotend
                                for(i=[30:360/6:179]) rotate([0,0,i]) {
                                    cube([100,8,8],center=true);
                                }
                            }
                            
            translate([-(hot_rad+thickness*2),0,0]) cylinder(r=hot_rad+thickness*2+wall, h=thickness+wall*10, center=true, $fn=facets);
            //an extra tongue for strength
            translate([0,0,0])cube([100,tongue_width,wall], center=true);
        }
    }
}

module duct(){
    duct_w = 15+slop;
    duct_h = 20+slop;
    rad = 20;
    
    translate([0,0,rad+wall+duct_h/2]) rotate([-90,0,0]) union(){
        intersection(){
            rotate_extrude(angle = 90, convexity = 2){
                translate([rad,0,0])
                difference(){
                    square([duct_h+wall*2, duct_w+wall*2], center=true);
                    square([duct_h, duct_w], center=true);
                }
            }
            translate([0,0,-100]) cube([200,200,200]);
        }
        
        translate([rad,0,0]) rotate([90,0,0]) translate([0,0,8]) difference(){
            hull(){
                translate([0,0,-8]) cube([duct_h+wall*2,duct_w+wall*2,.1], center=true);
                #translate([duct_h/2+wall/2,0,8]) cube([wall,duct_w+wall*2,.1], center=true);
            }
            
            //hollow center
            cube([duct_h,duct_w,16.3], center=true);
            
            //slot for the clip
            translate([wall+1,0,(12-16)/2]) cube([duct_h+wall*2,2,12], center=true);
        }
        
    }
}

module duct_angle(angle=30){
    duct_w = 15+slop;
    duct_h = 20+slop;
    rad = 20;
    
    translate([0,0,rad+wall+duct_h/2]) rotate([-90,0,0]) union(){
        intersection(){
            rotate_extrude(angle = 45, convexity = 2){
                translate([rad,0,0])
                difference(){
                    square([duct_h+wall*2, duct_w+wall*2], center=true);
                    square([duct_h, duct_w], center=true);
                }
            }
            translate([0,0,-100]) cube([200,200,200]);
            translate([0,0,-100]) rotate([0,0,90-angle]) cube([200,200,200]);
        }
        
        rotate([0,0,90-angle]) translate([rad,0,0]) rotate([90,0,0]) translate([0,0,8]) difference(){
            hull(){
                translate([0,0,-8]) cube([duct_h+wall*2,duct_w+wall*2,.1], center=true);
                translate([duct_h/2+wall/2,0,8]) cube([wall,duct_w+wall*2,.1], center=true);
            }
            
            //hollow center
            cube([duct_h,duct_w,16.3], center=true);
            
            //slot for the clip
            translate([wall+1,0,(12-16)/2]) cube([duct_h+wall*2,2,12], center=true);
        }
        
    }
}
